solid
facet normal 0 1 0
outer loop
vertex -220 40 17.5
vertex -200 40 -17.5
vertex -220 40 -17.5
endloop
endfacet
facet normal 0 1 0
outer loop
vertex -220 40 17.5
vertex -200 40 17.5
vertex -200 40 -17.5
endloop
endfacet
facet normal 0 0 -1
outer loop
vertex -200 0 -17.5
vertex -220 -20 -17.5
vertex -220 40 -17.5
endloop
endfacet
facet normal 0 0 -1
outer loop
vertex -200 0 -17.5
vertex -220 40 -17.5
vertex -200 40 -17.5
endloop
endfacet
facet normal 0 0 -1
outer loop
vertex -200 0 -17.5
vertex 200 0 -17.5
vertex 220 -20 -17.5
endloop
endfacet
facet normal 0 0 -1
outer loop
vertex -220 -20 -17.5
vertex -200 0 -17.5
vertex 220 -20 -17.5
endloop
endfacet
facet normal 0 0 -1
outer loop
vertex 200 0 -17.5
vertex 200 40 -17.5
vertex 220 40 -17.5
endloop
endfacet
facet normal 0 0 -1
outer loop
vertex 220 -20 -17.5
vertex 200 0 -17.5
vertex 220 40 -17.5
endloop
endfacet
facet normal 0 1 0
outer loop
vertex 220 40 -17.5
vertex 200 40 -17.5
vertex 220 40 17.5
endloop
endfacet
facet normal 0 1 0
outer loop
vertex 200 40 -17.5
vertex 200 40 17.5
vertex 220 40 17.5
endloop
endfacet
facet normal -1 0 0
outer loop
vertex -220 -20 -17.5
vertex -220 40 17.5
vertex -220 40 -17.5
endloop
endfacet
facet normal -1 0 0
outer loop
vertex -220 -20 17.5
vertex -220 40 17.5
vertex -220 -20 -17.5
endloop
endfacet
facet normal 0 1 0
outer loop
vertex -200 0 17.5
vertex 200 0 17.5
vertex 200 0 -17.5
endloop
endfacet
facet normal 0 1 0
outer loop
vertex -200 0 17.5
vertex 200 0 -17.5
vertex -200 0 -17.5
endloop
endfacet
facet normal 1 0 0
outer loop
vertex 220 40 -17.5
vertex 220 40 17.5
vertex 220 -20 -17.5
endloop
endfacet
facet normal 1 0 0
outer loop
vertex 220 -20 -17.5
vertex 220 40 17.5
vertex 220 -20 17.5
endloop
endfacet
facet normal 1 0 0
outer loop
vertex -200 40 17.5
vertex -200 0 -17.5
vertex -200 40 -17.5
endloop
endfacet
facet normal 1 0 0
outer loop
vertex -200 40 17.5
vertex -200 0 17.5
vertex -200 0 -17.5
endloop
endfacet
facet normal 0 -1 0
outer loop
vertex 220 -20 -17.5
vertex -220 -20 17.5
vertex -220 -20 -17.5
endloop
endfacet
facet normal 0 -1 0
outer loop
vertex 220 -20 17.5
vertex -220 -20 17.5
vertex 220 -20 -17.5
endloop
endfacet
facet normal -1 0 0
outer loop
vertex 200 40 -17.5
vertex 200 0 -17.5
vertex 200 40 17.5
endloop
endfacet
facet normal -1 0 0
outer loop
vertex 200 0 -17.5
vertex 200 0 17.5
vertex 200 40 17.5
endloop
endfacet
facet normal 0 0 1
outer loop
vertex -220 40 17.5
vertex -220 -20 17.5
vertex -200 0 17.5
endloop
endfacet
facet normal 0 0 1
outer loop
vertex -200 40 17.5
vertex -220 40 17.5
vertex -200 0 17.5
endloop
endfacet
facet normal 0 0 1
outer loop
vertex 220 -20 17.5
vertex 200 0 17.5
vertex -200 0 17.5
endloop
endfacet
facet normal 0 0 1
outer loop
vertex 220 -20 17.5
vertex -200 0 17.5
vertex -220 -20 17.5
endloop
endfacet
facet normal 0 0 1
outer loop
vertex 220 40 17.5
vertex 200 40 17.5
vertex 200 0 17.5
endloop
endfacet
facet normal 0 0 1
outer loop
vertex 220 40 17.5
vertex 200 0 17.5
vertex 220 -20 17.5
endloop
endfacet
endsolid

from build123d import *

# Parameters (mm, degrees)
EXTRUDE_THIN1_DEPTH = 17.5005


with BuildPart() as part:
    # Sketch1 → Extrude-Thin1 (new body, symmetric)
    with BuildSketch(Plane.XY):
        Polygon((0, 0), (200, 0), (200, 40), (220, 40), (220, -20), (0, -20), align=None)
    extrude_thin1 = extrude(amount=EXTRUDE_THIN1_DEPTH, both=True)

    # Mirror1: Extrude-Thin1 across plane
    add(extrude_thin1.mirror(Plane(origin=(0, 0, 0), x_dir=(0, 0, 1), z_dir=(1, 0, 0))))


solid = part.part
